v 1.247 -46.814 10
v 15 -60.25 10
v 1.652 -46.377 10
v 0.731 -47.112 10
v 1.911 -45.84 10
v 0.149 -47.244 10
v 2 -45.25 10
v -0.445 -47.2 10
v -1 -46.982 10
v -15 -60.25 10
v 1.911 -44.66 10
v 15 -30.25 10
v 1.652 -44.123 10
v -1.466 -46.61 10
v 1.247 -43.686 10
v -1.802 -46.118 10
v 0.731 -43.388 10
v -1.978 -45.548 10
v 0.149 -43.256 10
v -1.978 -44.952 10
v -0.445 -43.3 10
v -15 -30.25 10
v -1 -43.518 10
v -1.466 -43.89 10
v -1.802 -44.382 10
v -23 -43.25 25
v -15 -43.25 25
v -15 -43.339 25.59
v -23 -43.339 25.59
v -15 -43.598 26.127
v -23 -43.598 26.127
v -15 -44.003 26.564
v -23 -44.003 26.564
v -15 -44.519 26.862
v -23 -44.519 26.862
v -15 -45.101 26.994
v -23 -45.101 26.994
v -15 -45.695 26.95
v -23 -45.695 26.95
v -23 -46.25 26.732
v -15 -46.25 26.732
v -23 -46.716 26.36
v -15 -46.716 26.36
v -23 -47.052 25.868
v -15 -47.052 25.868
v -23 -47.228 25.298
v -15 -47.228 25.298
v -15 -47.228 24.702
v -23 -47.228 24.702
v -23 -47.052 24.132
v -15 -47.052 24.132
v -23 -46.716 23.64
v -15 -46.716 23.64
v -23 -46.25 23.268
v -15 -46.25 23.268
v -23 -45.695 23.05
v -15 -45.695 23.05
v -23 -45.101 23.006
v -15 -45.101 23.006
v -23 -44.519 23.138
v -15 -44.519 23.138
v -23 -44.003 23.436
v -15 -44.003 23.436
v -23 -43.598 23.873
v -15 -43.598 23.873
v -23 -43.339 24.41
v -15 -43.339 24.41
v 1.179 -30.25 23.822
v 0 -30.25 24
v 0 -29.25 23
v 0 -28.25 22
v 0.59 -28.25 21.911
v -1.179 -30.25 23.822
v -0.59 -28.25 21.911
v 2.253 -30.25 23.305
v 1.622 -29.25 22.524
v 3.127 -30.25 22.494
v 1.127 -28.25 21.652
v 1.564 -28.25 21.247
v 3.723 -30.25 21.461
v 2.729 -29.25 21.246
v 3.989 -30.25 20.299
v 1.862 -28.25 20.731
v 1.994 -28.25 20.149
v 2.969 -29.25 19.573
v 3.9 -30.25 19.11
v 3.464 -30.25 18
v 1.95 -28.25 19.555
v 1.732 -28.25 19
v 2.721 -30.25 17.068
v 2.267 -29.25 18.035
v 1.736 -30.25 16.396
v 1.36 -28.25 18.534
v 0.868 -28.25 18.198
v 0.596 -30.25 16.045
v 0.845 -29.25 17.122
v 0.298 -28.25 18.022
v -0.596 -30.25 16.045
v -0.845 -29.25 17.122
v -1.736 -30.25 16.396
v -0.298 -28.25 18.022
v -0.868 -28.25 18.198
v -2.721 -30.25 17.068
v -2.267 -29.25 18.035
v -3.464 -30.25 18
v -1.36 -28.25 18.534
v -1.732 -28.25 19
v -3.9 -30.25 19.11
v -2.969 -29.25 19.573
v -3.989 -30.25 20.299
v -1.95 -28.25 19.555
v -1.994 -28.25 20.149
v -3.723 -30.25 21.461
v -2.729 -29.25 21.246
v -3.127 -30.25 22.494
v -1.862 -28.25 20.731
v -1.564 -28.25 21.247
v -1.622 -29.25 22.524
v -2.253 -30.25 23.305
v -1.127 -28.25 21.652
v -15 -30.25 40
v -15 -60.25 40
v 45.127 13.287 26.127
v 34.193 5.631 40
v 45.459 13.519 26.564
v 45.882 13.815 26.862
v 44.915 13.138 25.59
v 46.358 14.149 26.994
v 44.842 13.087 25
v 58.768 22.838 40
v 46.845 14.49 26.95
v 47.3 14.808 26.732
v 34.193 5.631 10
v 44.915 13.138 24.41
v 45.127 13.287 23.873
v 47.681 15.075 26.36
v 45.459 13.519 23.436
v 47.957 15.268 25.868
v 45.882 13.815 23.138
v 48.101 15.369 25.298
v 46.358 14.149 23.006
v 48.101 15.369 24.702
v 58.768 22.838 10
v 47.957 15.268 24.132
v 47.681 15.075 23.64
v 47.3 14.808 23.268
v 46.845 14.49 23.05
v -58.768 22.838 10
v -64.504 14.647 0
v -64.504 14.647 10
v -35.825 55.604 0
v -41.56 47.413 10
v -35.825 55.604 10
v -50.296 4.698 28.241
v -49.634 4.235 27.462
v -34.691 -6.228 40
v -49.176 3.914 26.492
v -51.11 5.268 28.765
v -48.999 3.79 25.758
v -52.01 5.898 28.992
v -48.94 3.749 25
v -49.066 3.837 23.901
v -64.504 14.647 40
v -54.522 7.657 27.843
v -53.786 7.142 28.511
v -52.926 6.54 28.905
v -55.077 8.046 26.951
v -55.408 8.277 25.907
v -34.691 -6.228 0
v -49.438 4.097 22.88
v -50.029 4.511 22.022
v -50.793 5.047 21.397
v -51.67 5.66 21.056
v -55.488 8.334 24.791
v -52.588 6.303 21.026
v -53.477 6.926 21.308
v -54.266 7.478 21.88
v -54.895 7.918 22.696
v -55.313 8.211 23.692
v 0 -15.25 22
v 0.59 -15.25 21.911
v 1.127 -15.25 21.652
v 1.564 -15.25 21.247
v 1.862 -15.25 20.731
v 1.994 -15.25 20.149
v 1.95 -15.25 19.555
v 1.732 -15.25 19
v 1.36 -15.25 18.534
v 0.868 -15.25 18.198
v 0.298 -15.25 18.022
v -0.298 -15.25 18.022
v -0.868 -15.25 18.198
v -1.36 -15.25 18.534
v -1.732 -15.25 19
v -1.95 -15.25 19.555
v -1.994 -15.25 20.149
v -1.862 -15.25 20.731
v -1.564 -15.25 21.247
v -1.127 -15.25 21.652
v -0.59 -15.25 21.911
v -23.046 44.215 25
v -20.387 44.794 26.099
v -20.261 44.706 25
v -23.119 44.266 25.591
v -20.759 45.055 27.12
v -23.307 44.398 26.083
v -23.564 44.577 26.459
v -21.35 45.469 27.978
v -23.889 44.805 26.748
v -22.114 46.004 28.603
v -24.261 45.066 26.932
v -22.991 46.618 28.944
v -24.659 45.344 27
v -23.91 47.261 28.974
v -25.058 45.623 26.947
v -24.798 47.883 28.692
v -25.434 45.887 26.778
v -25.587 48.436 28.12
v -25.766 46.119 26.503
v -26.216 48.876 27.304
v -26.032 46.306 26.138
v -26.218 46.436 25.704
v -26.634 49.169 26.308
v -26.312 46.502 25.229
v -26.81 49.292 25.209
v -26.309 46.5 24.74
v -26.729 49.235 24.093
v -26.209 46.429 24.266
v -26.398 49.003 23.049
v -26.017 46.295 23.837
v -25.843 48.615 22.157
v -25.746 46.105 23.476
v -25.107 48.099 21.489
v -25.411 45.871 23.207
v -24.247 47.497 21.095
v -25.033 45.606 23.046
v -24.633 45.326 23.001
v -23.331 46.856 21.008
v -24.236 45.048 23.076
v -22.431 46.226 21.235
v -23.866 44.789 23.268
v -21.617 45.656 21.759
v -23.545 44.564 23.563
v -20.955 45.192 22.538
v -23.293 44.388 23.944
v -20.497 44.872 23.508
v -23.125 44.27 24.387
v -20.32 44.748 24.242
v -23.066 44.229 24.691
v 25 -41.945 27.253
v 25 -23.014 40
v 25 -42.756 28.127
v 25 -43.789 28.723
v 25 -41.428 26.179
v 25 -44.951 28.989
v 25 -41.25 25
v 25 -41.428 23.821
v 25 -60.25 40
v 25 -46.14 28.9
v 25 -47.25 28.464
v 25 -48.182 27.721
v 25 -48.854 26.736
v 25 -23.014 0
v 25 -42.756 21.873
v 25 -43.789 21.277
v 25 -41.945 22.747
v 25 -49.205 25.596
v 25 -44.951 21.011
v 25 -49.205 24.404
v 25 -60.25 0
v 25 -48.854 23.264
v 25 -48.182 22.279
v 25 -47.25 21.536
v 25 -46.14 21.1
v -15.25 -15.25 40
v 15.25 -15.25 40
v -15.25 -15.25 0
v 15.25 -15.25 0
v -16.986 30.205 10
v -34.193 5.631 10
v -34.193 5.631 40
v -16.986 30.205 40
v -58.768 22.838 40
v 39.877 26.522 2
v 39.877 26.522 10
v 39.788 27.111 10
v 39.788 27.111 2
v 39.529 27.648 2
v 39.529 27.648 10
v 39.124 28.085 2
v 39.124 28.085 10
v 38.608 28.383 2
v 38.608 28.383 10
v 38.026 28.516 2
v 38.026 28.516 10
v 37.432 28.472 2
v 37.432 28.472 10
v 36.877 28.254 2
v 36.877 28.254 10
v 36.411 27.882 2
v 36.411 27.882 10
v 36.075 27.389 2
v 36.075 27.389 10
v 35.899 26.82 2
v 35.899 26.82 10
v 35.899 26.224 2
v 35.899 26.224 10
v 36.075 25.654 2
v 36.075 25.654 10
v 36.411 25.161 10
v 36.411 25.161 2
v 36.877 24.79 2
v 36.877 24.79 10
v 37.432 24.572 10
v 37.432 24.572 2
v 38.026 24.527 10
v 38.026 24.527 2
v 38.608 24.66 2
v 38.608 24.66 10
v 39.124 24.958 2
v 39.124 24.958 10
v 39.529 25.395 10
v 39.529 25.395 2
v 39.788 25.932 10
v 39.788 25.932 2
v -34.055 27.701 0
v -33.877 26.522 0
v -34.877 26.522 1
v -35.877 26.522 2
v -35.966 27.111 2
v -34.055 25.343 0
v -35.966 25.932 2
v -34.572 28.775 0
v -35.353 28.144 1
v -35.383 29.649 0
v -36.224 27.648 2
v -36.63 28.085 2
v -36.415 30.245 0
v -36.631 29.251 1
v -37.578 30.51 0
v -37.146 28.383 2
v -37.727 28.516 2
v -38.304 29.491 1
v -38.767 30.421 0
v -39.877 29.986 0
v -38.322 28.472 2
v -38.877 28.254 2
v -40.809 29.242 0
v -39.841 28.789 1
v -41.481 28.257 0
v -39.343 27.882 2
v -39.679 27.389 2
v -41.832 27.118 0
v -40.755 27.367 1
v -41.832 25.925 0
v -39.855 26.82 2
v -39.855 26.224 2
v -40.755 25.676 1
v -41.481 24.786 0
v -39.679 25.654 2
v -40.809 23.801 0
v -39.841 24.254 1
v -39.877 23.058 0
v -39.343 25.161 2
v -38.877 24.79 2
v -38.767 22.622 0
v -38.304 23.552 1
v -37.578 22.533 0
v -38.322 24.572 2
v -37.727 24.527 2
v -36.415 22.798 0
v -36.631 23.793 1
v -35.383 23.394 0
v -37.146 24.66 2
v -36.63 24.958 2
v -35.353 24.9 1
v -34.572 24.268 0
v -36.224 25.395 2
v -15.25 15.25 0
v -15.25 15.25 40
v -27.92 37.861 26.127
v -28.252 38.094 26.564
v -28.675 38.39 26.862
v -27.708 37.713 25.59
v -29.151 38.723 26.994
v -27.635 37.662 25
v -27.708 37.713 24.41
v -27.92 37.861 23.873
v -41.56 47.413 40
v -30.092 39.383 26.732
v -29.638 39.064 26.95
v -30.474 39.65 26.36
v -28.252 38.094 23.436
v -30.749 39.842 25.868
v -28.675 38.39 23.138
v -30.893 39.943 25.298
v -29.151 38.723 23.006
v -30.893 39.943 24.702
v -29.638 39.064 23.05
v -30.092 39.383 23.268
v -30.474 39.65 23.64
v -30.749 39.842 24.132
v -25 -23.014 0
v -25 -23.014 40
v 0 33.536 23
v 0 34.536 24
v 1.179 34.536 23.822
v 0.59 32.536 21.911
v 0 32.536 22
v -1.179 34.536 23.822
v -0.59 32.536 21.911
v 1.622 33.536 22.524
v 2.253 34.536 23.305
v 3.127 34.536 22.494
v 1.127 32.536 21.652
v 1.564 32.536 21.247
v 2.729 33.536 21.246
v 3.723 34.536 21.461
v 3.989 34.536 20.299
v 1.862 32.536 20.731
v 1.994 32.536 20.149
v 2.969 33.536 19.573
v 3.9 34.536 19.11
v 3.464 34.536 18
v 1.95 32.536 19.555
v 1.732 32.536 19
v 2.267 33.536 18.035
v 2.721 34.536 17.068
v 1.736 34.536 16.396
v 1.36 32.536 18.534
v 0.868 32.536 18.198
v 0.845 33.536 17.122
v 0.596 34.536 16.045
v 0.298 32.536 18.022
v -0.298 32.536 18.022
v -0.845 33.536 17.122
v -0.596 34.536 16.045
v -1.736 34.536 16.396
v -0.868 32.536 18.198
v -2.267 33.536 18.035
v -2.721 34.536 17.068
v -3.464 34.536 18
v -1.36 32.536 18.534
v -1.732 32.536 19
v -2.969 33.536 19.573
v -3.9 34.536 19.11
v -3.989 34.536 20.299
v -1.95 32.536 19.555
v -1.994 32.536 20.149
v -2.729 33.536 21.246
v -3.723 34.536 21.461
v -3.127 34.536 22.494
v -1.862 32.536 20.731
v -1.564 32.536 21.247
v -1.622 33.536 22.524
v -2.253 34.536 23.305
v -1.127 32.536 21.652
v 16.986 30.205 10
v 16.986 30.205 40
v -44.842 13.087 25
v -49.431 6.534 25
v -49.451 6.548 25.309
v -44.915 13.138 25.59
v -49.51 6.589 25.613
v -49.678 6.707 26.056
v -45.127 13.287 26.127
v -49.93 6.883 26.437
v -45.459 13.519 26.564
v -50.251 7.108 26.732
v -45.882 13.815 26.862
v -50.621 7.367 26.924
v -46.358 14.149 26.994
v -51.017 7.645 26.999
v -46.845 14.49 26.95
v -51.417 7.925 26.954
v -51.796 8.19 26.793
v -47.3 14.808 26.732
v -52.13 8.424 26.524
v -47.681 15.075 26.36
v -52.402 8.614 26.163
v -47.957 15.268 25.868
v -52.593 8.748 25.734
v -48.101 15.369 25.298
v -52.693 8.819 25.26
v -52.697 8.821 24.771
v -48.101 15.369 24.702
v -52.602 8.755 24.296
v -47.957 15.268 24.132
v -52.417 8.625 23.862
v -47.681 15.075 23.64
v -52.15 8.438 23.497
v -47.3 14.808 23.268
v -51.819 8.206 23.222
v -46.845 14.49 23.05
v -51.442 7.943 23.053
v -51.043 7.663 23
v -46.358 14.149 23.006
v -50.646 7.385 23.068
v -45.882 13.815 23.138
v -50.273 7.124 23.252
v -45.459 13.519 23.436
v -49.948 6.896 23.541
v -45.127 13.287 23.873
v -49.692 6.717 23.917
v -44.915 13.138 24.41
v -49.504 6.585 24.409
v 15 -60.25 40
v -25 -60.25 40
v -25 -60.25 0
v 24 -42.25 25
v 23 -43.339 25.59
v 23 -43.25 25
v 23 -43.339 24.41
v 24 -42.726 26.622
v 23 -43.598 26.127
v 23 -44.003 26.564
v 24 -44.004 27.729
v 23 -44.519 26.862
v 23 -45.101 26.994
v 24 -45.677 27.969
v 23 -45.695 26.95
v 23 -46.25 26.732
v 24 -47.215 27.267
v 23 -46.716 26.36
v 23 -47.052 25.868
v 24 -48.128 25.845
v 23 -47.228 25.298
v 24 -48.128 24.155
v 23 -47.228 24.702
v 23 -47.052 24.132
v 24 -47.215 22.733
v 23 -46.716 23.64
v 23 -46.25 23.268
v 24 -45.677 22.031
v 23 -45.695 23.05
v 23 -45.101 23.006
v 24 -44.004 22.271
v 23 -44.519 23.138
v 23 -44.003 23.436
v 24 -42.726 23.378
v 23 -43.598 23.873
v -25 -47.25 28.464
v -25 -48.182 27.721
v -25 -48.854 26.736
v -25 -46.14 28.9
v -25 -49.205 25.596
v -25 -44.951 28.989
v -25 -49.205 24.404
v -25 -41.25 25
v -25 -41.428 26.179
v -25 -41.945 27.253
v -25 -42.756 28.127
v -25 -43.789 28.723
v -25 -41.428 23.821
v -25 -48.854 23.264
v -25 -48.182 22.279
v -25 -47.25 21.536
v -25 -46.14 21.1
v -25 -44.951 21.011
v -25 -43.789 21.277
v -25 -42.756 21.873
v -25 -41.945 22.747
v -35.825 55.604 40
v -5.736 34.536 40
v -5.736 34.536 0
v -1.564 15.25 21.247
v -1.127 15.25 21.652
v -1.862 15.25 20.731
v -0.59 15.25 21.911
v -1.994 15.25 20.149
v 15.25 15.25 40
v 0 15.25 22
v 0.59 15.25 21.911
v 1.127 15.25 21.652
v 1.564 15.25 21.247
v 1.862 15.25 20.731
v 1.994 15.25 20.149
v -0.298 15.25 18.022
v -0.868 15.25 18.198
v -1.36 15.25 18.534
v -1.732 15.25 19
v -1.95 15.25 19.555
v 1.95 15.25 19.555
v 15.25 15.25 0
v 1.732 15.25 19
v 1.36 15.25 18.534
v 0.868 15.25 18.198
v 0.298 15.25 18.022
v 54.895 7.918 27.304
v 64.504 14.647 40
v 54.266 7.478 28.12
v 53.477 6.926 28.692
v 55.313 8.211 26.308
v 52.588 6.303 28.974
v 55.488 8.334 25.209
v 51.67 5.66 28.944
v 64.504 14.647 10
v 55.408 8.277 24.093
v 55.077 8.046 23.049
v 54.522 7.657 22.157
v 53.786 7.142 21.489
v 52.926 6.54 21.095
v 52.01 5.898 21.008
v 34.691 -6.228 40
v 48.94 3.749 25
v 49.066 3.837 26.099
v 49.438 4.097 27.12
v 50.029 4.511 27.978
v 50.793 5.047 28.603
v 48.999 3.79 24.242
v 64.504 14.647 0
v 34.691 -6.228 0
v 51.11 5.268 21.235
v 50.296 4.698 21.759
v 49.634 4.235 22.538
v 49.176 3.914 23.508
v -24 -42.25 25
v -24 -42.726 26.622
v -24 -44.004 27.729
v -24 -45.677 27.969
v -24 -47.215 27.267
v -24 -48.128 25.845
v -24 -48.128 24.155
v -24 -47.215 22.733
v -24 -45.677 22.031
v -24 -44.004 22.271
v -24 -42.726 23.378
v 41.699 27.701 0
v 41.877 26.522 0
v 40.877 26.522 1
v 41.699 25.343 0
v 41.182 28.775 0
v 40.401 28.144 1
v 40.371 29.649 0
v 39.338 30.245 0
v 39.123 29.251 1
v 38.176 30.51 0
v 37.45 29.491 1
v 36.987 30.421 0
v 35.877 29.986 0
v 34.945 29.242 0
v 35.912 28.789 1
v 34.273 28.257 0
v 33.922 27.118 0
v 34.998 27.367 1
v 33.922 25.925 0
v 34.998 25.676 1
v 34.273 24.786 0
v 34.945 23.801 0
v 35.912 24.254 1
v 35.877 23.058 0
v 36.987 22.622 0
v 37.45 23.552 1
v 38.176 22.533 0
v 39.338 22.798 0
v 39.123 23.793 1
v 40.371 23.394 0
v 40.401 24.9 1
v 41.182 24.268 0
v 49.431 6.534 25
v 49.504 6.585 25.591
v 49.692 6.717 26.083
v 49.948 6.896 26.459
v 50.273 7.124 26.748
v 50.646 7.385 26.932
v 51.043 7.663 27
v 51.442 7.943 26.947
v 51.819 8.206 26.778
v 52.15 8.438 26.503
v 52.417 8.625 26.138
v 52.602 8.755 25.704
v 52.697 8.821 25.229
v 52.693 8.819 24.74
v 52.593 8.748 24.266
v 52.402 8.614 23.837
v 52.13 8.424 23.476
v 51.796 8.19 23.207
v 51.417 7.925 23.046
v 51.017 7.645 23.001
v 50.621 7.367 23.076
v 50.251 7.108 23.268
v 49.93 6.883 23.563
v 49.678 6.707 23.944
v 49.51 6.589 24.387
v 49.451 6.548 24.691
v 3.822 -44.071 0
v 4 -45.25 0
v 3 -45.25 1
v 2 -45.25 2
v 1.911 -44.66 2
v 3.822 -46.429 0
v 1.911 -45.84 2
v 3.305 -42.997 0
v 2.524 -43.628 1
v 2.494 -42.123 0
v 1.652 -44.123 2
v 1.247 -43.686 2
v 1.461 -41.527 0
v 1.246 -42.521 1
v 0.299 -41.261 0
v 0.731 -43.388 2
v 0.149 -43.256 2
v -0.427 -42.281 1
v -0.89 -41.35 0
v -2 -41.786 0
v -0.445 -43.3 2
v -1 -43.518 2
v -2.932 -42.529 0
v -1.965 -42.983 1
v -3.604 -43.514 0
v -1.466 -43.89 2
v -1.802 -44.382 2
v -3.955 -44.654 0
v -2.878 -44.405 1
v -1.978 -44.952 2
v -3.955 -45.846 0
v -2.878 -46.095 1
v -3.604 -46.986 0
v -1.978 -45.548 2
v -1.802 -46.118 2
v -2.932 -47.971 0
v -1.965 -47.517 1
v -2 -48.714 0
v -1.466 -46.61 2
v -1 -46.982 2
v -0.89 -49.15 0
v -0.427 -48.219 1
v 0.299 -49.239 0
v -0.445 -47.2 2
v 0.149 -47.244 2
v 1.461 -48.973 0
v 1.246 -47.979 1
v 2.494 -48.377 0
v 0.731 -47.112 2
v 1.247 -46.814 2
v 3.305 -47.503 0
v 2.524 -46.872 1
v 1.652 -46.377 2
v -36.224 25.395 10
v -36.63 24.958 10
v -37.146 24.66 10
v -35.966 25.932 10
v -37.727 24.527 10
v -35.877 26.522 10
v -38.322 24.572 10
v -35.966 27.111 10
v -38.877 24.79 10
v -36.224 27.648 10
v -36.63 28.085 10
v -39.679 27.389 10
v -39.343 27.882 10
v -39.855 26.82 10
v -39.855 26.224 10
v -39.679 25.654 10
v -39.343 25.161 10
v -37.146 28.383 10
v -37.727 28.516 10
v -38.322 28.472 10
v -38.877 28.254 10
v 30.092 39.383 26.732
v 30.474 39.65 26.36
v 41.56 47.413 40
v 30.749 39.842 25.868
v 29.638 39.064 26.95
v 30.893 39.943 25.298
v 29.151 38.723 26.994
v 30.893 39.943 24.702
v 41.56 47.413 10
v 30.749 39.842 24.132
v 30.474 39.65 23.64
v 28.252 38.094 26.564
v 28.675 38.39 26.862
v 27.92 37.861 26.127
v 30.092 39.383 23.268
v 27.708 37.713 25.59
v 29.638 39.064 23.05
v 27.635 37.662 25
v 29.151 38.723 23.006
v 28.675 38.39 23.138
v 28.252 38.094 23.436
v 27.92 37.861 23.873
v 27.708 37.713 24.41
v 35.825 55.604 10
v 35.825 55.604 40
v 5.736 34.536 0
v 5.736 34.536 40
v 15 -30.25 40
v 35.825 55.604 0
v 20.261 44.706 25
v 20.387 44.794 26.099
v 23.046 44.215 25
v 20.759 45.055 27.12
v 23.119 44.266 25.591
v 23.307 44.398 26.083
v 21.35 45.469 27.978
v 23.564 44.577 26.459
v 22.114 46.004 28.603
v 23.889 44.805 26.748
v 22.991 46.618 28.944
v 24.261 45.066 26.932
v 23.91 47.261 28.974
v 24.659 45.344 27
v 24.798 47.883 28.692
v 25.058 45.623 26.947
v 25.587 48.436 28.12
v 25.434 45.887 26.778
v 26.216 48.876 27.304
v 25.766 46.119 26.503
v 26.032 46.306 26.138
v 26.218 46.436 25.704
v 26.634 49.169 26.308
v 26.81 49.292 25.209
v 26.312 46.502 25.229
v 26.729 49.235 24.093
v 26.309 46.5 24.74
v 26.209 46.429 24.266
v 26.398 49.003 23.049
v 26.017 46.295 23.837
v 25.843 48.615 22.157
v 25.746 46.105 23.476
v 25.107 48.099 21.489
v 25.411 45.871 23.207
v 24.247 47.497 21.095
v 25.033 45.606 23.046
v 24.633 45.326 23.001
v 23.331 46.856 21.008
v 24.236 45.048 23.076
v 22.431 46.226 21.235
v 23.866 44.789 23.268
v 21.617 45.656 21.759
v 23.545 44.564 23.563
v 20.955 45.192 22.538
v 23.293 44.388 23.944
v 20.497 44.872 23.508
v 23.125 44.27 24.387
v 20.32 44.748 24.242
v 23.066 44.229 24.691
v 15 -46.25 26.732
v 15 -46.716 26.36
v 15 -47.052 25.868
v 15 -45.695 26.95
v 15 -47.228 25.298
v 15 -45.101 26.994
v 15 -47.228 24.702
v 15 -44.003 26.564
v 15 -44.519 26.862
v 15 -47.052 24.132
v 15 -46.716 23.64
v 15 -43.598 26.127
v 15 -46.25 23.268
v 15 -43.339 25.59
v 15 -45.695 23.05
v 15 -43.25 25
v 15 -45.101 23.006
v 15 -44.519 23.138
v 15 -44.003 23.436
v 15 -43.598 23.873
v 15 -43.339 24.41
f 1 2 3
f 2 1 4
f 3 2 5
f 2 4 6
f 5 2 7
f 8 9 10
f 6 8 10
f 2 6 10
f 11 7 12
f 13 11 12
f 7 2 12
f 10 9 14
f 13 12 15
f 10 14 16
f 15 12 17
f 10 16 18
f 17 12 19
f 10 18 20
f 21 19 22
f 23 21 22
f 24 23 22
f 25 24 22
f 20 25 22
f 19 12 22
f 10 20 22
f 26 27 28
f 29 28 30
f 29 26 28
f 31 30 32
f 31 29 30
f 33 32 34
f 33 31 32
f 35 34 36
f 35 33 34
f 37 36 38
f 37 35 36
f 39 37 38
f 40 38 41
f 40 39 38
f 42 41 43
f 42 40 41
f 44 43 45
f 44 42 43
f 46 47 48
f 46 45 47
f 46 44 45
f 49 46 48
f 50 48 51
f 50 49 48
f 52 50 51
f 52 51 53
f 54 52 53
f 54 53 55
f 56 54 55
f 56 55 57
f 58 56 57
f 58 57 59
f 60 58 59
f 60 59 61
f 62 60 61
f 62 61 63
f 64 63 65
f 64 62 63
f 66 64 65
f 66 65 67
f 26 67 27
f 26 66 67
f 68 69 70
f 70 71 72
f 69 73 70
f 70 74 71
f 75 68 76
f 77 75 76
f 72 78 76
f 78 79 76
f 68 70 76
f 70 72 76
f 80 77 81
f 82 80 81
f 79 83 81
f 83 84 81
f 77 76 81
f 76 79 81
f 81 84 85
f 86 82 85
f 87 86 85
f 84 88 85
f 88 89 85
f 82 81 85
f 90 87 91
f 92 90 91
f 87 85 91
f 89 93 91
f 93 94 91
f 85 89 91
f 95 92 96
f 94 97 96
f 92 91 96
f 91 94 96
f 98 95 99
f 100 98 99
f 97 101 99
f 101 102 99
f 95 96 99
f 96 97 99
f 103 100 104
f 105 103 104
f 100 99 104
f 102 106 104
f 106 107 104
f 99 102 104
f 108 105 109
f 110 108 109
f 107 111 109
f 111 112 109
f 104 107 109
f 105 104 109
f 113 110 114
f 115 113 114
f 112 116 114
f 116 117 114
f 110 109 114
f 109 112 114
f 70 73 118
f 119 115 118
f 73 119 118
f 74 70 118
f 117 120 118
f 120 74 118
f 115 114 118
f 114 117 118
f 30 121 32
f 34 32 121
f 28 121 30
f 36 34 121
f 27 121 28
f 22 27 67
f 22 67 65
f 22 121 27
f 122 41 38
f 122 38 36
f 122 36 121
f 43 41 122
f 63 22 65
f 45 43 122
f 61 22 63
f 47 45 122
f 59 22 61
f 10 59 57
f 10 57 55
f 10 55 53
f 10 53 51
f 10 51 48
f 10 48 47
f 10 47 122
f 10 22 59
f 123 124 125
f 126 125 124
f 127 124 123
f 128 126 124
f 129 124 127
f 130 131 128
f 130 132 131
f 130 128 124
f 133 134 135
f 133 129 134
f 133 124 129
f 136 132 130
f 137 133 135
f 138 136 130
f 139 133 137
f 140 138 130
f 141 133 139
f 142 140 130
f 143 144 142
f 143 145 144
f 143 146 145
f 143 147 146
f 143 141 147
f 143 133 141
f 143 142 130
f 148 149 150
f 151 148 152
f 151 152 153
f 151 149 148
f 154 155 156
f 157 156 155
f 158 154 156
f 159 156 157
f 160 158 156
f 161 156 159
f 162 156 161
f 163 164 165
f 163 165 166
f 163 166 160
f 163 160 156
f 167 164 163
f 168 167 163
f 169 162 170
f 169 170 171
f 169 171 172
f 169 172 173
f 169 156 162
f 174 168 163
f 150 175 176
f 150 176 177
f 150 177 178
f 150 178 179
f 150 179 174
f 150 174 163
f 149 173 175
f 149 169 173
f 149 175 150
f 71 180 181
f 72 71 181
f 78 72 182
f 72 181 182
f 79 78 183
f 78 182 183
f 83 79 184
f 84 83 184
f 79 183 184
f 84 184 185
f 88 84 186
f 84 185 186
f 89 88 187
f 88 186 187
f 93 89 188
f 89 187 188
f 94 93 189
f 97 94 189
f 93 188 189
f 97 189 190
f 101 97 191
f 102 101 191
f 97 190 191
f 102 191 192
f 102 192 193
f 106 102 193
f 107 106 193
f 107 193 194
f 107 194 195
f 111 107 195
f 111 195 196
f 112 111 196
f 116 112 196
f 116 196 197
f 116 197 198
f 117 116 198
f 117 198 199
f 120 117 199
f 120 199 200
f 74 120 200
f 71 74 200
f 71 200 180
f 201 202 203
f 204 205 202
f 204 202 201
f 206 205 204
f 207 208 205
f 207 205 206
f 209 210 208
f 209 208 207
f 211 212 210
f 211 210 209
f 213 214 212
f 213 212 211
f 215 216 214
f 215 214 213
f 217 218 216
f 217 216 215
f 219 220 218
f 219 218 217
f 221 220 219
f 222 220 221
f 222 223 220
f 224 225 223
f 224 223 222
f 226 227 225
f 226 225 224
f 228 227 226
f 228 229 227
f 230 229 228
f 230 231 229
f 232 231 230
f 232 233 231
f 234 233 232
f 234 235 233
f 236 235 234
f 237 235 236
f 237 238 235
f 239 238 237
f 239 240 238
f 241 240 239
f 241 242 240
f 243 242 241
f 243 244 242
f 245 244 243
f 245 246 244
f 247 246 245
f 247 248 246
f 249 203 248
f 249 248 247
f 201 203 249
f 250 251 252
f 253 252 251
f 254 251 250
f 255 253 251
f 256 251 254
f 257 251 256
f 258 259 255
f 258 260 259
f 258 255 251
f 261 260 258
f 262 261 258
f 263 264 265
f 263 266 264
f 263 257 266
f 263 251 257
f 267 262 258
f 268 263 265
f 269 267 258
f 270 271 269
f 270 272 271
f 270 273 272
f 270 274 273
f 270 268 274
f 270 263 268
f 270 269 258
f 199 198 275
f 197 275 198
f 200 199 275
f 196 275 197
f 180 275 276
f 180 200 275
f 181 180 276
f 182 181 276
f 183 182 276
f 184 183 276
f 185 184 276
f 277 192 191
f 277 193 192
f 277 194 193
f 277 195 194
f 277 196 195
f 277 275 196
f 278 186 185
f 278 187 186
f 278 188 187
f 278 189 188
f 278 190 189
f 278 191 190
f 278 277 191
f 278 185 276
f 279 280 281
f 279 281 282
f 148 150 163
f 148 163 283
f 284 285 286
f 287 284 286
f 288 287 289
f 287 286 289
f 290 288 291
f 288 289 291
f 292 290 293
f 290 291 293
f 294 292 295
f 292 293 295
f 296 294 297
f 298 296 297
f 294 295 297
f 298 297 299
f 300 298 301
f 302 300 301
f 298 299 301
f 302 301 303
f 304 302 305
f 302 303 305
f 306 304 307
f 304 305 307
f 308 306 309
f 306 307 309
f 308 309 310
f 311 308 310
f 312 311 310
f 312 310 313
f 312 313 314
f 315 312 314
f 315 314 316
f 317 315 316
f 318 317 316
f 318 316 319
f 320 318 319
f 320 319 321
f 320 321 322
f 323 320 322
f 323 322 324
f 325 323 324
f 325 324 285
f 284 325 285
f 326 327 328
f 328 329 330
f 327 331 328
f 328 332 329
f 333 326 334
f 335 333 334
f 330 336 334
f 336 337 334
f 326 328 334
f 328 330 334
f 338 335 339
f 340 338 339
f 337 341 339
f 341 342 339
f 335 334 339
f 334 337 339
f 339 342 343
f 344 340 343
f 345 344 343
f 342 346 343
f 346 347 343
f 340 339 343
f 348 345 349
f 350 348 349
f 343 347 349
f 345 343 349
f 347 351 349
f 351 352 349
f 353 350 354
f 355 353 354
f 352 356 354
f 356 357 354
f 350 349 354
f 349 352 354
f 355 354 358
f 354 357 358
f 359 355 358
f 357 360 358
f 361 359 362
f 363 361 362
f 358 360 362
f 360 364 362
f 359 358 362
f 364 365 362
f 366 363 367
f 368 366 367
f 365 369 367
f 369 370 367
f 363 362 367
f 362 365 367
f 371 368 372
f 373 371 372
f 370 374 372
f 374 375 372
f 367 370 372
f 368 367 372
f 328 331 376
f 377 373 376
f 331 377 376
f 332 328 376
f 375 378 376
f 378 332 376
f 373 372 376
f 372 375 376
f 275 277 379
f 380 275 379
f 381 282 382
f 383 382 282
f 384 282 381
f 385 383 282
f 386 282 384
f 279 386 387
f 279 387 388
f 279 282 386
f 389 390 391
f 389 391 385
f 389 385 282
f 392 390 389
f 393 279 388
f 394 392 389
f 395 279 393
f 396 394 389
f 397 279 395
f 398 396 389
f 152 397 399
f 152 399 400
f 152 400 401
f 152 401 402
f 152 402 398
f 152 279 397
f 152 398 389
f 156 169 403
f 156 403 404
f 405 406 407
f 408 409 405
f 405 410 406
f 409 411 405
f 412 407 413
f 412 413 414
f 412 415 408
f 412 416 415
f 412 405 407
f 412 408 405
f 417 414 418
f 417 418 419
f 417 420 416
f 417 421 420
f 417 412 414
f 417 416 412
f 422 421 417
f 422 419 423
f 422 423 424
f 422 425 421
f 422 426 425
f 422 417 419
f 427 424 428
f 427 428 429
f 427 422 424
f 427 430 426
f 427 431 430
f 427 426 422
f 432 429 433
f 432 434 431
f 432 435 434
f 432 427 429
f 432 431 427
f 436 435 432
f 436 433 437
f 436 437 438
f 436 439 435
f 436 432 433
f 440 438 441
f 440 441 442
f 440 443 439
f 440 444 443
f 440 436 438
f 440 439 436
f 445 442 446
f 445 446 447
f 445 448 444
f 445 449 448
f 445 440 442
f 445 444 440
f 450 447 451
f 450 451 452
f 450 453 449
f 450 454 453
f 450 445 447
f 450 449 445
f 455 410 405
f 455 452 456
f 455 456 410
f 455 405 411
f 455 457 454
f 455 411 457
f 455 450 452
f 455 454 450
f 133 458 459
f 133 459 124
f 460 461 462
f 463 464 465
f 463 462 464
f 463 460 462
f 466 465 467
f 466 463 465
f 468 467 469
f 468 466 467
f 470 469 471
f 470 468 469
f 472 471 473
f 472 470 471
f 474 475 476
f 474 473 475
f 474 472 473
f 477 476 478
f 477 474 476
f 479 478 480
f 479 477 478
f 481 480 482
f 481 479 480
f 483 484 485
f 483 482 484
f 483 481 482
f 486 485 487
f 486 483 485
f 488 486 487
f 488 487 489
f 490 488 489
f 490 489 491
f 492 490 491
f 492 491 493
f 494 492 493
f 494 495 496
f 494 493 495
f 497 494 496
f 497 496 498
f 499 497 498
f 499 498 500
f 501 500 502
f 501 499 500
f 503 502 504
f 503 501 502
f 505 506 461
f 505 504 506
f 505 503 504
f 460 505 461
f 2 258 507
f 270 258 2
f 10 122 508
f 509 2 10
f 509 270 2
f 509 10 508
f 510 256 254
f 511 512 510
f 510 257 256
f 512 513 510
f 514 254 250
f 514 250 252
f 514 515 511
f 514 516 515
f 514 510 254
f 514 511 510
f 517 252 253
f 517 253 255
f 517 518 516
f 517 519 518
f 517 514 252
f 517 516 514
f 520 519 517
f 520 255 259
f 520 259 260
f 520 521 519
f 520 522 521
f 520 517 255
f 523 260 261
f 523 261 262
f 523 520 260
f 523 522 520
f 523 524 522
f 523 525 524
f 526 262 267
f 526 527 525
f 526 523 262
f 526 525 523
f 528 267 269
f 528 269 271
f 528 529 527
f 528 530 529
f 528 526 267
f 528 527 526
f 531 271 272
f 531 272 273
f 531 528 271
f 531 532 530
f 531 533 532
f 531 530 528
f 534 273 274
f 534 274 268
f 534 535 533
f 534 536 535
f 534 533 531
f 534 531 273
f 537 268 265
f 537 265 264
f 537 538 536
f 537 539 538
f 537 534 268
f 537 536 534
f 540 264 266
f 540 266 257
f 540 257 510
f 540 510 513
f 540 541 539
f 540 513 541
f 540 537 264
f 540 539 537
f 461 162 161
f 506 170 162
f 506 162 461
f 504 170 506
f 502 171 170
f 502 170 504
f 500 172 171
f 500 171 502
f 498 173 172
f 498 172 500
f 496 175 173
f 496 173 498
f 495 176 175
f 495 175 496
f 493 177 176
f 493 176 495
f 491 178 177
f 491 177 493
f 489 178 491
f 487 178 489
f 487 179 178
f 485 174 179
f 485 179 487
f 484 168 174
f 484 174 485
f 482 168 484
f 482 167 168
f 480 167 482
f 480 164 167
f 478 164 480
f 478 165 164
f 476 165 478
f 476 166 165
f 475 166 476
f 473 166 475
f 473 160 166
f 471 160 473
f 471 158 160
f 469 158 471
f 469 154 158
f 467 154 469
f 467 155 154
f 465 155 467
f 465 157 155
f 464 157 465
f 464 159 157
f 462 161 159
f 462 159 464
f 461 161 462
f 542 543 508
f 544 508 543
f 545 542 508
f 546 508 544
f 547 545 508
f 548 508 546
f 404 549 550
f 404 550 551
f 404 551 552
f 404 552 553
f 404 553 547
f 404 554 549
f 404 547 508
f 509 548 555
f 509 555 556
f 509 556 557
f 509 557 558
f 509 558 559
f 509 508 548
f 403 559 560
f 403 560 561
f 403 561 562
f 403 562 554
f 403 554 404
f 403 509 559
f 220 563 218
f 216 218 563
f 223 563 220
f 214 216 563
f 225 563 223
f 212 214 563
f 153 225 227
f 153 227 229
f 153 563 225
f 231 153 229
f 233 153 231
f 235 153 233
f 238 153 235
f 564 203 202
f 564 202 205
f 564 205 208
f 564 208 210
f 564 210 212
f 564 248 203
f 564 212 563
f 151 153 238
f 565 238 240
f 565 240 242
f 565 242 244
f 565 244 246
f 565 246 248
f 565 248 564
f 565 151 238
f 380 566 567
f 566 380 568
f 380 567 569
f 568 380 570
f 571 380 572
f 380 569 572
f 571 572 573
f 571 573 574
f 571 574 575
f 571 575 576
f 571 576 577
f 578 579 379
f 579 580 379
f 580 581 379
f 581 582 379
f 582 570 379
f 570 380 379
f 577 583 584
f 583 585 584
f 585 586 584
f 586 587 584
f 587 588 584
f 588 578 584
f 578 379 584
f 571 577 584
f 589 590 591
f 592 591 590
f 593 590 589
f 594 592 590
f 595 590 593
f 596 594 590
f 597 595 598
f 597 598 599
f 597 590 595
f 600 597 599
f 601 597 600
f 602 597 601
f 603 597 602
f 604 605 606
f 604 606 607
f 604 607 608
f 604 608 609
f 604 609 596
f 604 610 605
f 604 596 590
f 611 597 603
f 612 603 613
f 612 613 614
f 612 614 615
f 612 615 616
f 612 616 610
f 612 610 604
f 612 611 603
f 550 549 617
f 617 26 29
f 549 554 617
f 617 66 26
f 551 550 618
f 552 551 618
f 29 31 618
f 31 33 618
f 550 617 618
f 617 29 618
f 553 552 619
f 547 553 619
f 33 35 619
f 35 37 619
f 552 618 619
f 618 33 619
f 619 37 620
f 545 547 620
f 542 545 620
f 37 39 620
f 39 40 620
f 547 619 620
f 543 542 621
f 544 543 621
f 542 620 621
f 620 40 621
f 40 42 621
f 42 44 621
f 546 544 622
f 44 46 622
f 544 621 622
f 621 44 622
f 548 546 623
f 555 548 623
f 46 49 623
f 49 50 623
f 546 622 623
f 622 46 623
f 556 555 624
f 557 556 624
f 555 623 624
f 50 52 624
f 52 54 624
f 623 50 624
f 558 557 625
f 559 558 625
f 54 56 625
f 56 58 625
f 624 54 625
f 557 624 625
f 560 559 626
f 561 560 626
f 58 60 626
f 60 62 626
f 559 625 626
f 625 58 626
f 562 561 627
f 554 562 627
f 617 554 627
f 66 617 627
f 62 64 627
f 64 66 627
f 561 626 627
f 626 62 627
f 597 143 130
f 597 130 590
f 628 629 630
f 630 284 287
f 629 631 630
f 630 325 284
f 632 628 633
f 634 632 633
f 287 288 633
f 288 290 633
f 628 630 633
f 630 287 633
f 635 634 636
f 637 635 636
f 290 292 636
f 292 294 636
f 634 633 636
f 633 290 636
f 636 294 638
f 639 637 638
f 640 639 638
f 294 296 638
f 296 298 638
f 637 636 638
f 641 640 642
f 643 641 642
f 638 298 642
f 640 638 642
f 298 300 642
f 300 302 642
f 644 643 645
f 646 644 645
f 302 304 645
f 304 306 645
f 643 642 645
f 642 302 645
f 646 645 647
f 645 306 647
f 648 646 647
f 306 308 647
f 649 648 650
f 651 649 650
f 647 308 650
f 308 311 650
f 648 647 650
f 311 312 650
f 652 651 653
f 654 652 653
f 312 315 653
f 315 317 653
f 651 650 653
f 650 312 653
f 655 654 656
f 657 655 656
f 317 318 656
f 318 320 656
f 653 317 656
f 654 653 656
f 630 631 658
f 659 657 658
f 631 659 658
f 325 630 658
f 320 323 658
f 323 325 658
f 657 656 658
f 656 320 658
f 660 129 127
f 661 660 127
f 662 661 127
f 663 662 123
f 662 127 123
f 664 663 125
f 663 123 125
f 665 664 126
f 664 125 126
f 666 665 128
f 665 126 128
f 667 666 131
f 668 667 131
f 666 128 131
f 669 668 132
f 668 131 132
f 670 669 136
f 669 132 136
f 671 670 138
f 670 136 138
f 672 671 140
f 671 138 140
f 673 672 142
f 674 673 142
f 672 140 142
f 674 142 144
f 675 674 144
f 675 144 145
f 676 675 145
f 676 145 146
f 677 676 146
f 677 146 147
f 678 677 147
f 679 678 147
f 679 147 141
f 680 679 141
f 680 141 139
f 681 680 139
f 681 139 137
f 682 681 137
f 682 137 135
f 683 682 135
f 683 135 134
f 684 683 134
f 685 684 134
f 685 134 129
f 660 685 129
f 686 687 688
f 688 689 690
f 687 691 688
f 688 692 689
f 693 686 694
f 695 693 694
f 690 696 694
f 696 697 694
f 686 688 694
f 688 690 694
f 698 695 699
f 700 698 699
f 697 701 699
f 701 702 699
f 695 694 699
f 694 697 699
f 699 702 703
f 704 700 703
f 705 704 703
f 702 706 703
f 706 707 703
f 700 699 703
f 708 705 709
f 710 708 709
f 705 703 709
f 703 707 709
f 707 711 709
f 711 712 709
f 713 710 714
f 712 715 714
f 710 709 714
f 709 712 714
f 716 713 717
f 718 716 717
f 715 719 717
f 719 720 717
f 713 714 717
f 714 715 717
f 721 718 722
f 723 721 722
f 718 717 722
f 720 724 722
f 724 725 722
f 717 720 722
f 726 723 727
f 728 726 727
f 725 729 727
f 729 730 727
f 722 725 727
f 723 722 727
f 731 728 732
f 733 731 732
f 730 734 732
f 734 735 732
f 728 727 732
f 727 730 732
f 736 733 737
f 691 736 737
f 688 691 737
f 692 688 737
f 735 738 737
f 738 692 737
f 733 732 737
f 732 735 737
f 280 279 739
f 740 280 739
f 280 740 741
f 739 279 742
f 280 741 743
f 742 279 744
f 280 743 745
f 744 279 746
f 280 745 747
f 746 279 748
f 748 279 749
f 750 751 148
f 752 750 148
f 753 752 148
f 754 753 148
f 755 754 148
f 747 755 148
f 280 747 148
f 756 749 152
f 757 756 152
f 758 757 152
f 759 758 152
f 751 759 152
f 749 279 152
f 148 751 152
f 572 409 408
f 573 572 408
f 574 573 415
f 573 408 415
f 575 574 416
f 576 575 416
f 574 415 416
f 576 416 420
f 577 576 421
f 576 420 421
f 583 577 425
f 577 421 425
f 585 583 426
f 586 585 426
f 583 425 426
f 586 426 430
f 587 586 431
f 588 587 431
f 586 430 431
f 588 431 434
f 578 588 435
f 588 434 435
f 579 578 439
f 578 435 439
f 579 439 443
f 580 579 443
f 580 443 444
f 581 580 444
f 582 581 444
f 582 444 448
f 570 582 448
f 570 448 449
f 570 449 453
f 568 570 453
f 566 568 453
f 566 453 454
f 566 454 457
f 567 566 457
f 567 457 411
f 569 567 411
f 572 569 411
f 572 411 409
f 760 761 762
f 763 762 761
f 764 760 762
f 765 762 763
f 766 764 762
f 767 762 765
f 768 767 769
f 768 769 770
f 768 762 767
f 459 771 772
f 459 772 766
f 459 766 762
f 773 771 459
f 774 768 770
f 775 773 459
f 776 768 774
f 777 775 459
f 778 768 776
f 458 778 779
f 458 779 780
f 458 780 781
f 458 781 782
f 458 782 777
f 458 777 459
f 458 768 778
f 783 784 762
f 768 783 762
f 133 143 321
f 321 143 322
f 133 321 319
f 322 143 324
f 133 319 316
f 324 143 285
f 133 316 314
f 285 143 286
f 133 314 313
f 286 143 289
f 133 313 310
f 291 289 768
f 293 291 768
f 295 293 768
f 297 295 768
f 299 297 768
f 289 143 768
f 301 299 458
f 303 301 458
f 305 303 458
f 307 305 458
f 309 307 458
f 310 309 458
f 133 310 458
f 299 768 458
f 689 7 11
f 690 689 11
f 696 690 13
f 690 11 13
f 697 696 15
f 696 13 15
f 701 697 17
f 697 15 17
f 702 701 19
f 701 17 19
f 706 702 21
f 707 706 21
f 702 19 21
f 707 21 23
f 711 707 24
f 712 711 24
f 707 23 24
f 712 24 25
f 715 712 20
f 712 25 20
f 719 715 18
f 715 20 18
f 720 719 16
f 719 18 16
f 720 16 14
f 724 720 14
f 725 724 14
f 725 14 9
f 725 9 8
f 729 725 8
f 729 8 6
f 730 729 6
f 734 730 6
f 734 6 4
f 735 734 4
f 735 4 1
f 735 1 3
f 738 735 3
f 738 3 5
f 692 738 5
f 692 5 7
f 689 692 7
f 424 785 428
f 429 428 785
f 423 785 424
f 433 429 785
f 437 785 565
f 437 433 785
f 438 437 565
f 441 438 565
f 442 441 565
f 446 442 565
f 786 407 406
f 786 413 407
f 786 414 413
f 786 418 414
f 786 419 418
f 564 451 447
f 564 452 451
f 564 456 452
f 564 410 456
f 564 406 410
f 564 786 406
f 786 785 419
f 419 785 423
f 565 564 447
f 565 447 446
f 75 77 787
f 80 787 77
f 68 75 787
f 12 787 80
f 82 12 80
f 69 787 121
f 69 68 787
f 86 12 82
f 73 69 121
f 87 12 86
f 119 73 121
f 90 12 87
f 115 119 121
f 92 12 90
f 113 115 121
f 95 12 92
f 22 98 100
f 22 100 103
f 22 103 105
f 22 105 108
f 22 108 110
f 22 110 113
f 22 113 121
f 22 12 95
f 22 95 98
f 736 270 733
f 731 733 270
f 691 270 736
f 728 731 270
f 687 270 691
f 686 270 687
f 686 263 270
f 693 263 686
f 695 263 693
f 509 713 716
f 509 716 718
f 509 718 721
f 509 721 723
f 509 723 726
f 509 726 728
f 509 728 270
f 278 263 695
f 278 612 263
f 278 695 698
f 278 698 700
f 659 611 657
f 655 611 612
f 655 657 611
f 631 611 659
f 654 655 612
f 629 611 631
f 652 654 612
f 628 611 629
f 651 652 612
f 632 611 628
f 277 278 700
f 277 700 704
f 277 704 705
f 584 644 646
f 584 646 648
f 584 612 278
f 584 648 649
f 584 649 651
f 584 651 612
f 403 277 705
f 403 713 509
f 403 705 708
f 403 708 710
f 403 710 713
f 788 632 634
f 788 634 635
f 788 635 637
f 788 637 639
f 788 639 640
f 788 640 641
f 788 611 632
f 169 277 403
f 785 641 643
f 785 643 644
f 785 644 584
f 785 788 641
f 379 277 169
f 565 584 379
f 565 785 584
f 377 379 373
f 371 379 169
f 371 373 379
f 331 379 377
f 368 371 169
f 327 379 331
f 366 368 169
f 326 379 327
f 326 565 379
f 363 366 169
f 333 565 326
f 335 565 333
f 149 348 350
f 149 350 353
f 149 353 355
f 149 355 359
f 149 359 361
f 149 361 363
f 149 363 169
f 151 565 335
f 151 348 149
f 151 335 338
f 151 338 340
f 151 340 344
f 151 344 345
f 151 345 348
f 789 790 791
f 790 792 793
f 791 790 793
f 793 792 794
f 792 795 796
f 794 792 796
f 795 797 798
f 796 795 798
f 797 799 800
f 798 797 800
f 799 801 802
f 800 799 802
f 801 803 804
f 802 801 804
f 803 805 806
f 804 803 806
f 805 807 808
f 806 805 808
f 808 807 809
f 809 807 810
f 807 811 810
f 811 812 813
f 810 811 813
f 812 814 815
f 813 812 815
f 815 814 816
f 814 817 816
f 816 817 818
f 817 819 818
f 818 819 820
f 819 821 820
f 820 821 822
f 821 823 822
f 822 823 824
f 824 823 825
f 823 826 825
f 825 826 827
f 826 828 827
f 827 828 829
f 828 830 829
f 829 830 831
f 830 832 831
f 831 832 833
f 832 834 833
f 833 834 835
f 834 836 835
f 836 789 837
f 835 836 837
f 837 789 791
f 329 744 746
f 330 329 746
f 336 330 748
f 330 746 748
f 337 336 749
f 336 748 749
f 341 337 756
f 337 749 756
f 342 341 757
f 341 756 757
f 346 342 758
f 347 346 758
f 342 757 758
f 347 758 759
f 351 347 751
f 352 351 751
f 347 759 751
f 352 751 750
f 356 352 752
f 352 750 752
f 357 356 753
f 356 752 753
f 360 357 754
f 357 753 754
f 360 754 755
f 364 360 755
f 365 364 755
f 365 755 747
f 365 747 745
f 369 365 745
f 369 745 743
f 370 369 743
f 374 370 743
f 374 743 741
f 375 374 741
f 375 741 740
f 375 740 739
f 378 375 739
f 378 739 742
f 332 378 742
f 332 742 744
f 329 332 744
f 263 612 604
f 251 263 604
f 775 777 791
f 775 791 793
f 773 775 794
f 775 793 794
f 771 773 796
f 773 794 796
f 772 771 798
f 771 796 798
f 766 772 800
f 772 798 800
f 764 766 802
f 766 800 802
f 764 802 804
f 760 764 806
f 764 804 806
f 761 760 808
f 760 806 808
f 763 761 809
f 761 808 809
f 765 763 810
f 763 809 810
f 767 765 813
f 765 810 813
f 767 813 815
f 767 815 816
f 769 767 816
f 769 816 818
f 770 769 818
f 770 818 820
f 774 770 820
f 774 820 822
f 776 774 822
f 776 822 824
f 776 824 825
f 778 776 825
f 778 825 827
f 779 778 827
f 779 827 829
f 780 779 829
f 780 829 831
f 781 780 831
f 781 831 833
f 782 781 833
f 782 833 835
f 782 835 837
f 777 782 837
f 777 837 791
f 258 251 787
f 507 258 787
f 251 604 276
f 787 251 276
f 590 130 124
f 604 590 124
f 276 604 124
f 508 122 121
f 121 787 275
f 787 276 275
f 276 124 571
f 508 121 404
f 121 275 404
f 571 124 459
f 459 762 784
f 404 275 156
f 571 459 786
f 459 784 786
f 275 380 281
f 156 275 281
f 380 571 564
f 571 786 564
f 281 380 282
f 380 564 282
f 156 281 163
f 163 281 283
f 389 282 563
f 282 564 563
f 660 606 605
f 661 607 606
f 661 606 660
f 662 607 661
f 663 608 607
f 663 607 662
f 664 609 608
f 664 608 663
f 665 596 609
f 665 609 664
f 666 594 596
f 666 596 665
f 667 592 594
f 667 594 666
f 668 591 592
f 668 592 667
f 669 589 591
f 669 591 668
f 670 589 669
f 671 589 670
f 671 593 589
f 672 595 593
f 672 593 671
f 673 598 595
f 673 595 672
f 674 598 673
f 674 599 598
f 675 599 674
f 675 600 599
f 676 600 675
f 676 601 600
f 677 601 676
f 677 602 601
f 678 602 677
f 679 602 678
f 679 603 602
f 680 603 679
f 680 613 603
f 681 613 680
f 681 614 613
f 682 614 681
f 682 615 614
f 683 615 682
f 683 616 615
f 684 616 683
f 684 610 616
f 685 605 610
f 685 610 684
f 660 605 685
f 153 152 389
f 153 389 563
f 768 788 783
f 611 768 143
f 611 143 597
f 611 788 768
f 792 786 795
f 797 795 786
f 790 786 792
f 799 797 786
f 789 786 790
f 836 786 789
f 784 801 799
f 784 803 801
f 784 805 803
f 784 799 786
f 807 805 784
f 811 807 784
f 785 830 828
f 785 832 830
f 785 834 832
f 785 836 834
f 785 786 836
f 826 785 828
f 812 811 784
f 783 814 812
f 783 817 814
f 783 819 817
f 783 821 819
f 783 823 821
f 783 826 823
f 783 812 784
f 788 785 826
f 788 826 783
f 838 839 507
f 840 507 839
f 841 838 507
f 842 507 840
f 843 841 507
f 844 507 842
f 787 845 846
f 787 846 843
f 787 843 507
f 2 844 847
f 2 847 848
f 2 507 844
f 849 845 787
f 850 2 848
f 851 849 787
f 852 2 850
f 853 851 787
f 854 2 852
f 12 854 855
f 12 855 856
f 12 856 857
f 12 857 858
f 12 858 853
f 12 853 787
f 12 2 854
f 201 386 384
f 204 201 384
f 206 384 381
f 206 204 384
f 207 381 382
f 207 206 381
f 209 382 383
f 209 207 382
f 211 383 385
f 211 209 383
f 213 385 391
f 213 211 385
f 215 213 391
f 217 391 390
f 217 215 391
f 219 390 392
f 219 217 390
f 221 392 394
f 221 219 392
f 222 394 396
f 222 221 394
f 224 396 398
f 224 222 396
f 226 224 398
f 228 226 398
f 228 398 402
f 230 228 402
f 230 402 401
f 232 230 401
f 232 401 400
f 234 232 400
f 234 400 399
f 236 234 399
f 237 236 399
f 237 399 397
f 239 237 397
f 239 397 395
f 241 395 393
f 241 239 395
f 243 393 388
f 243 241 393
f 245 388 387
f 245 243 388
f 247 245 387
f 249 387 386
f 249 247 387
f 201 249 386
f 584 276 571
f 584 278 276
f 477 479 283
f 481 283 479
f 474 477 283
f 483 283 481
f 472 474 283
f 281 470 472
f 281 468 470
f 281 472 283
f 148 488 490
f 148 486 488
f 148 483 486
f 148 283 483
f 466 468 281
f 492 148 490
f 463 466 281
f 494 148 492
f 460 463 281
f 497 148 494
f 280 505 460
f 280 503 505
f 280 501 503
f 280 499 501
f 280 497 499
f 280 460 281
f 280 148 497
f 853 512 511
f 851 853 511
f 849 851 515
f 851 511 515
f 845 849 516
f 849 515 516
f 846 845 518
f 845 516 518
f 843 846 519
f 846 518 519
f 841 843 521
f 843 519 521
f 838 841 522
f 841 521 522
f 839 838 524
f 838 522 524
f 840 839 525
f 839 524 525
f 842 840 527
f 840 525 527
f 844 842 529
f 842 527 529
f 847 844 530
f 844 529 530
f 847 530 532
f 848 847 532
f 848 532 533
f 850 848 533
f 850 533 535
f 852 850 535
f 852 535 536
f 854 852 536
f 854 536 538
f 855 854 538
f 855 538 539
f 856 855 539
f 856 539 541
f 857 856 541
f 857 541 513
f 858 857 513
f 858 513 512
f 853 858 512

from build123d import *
from OCP.BRepFilletAPI import BRepFilletAPI_MakeChamfer

# Parameters (mm, degrees)
SKETCH1_W           = 30.5
SKETCH1_H           = 30.5
BOSS_EXTRUDE1_DEPTH = 10
SKETCH2_W           = 30.5
SKETCH2_H           = 30.5
BOSS_EXTRUDE2_DEPTH = 30
CHAMFER1_SIZE       = 10
CHAMFER1_SIZE2      = 11.831007916
SKETCH3_R           = 2
CUT_EXTRUDE1_DEPTH  = 94.224303623
SKETCH4_R           = 2
CUT_EXTRUDE2_DEPTH  = 120.721978802
SKETCH5_R           = 2
CUT_EXTRUDE3_DEPTH  = 30
SKETCH6_R           = 2
CUT_EXTRUDE4_DEPTH  = 122.429059078
CHAMFER3_SIZE       = 2


with BuildPart() as part:
    # Sketch1 → Boss-Extrude1 (new body)
    with BuildSketch(Plane.XY):
        Polygon((-25, -60.25), (-25, -13.014176264), (-64.503552507, 14.646508987), (-35.824730689, 55.604111202), (0, 30.519364719), (35.824730689, 55.604111202), (64.503552507, 14.646508987), (25, -13.014176264), (25, -60.25), align=None)
        Rectangle(SKETCH1_W, SKETCH1_H, mode=Mode.SUBTRACT)
    extrude(amount=BOSS_EXTRUDE1_DEPTH)

    # Sketch2 → Boss-Extrude2 (add)
    with BuildSketch(Plane.XY.offset(10)):
        Polygon((-58.767788143, 22.83802943), (-34.193226815, 5.63073634), (-16.985933724, 30.205297668), (-41.560495053, 47.412590759), (-35.824730689, 55.604111202), (0, 30.519364719), (35.824730689, 55.604111202), (41.560495053, 47.412590759), (16.985933724, 30.205297668), (34.193226815, 5.63073634), (58.767788143, 22.83802943), (64.503552507, 14.646508987), (25, -13.014176264), (25, -60.25), (15, -60.25), (15, -30.25), (-15, -30.25), (-15, -60.25), (-25, -60.25), (-25, -13.014176264), (-64.503552507, 14.646508987), align=None)
        Rectangle(SKETCH2_W, SKETCH2_H, mode=Mode.SUBTRACT)
    extrude(amount=BOSS_EXTRUDE2_DEPTH)

    # Chamfer1: one chamfer whose edges measure the first distance from different faces: ONE call of the kernel's chamfer builder (chamfer() names one face for all edges)
    chamfer1_edges_1 = [part.edges().sort_by_distance(p)[0] for p in [
        (-25, -13.014176264, 20),
    ]]
    chamfer1_side_1 = [part.faces().sort_by_distance(p)[0] for p in [
        (-25, -36.632088132, 20),
    ]]
    chamfer1_edges_2 = [part.edges().sort_by_distance(p)[0] for p in [
        (25, -13.014176264, 20),
    ]]
    chamfer1_side_2 = [part.faces().sort_by_distance(p)[0] for p in [
        (25, -36.632088132, 20),
    ]]
    chamfer1 = BRepFilletAPI_MakeChamfer(part.part.solid().wrapped)
    for e in chamfer1_edges_1:
        chamfer1.Add(CHAMFER1_SIZE, CHAMFER1_SIZE2, e.wrapped, chamfer1_side_1[0].wrapped)  # the first distance lies on this face
    for e in chamfer1_edges_2:
        chamfer1.Add(CHAMFER1_SIZE, CHAMFER1_SIZE2, e.wrapped, chamfer1_side_2[0].wrapped)  # the first distance lies on this face
    add(Compound.cast(chamfer1.Shape()), mode=Mode.REPLACE)

    # Chamfer2
    # the kernel refuses this chamfer: 10 mm, written as the material it adds along each edge
    with BuildSketch(Plane(origin=(0, 30.519364719, 40), x_dir=(0.8366959699781049, 0.5476676490558834, 0), z_dir=(0, 0, -1))) as chamfer2_piece_1:
        with BuildLine():
            Line((7.333326063, 0), (-2.934212568, -6.720719288))
            Line((-2.934212568, -6.720719288), (-3.119919002, -6.646468897))
            ThreePointArc((-3.119919002, -6.646468897), (-1.546295883, -3.328697528), (-0.185706433, 0.074250391))
            Line((-0.185706433, 0.074250391), (0.006257204, 0.199902095))
            ThreePointArc((0.006257204, 0.199902095), (3.669331251, 0.085242964), (7.339583267, 0.199902095))
            Line((7.339583267, 0.199902095), (7.333326063, 0))
        make_face()
    extrude(amount=40)

    # Sketch3 → Cut-Extrude1 (cut, through all)
    with BuildSketch(Plane.XY.offset(10)):
        with Locations((37.876860934, 26.521663549)):
            Circle(SKETCH3_R)
        with Locations((0, -45.25)):
            Circle(SKETCH3_R)
        with Locations((-37.876860934, 26.521663549)):
            Circle(SKETCH3_R)
    extrude(amount=-CUT_EXTRUDE1_DEPTH, mode=Mode.SUBTRACT)

    # Sketch4 → Cut-Extrude2 (cut, through all)
    with BuildSketch(Plane(origin=(-14.339410909, 20.478801107, 0), x_dir=(0.819152044288991, 0.5735764363510474, 0), z_dir=(-0.5735764363510474, 0.819152044288991, 0))):
        with Locations(Location((46.23910933, -25, 0), (0, 0, 180))):
            Circle(SKETCH4_R)
    cut_extrude2 = extrude(amount=-CUT_EXTRUDE2_DEPTH, mode=Mode.SUBTRACT)

    # Sketch5 → Cut-Extrude3 (cut)
    with BuildSketch(Plane(origin=(25, 0, 0), x_dir=(0, 0, -1), z_dir=(1, 0, 0))):
        with Locations(Location((-25, -45.25, 0), (0, 0, 90))):
            Circle(SKETCH5_R)
    cut_extrude3 = extrude(amount=-CUT_EXTRUDE3_DEPTH, mode=Mode.SUBTRACT)

    # Mirror1: Cut-Extrude2, Cut-Extrude3 across plane
    add(cut_extrude2.mirror(Plane(origin=(0, 0, 0), x_dir=(0, 0, 1), z_dir=(1, 0, 0))), mode=Mode.SUBTRACT)
    add(cut_extrude3.mirror(Plane(origin=(0, 0, 0), x_dir=(0, 0, 1), z_dir=(1, 0, 0))), mode=Mode.SUBTRACT)

    # Sketch6 → Cut-Extrude4 (cut, through all)
    with BuildSketch(Plane(origin=(0, 34.535590164, 0), x_dir=(1, 0, 0), z_dir=(0, 1, 0))):
        with Locations(Location((0, -20, 0), (0, 0, 270))):
            Circle(SKETCH6_R)
    extrude(amount=-CUT_EXTRUDE4_DEPTH, mode=Mode.SUBTRACT)

    # Chamfer3
    chamfer3_edges = [part.edges().sort_by_distance(p)[0] for p in [
        (35.876860934, 26.521663549, 0),
        (-2, -45.25, 0),
        (-39.876860934, 26.521663549, 0),
        (53.854575931, 7.190015315, 25),
        (25.175754113, 48.147617529, 25),
        (25, -47.25, 25),
        (-25.175754113, 48.147617529, 25),
        (-53.854575931, 7.190015315, 25),
        (-25, -47.25, 25),
        (0, -30.25, 18),
        (0, 34.535590164, 18),
    ]]
    chamfer(chamfer3_edges, length=CHAMFER3_SIZE)


solid = part.part
